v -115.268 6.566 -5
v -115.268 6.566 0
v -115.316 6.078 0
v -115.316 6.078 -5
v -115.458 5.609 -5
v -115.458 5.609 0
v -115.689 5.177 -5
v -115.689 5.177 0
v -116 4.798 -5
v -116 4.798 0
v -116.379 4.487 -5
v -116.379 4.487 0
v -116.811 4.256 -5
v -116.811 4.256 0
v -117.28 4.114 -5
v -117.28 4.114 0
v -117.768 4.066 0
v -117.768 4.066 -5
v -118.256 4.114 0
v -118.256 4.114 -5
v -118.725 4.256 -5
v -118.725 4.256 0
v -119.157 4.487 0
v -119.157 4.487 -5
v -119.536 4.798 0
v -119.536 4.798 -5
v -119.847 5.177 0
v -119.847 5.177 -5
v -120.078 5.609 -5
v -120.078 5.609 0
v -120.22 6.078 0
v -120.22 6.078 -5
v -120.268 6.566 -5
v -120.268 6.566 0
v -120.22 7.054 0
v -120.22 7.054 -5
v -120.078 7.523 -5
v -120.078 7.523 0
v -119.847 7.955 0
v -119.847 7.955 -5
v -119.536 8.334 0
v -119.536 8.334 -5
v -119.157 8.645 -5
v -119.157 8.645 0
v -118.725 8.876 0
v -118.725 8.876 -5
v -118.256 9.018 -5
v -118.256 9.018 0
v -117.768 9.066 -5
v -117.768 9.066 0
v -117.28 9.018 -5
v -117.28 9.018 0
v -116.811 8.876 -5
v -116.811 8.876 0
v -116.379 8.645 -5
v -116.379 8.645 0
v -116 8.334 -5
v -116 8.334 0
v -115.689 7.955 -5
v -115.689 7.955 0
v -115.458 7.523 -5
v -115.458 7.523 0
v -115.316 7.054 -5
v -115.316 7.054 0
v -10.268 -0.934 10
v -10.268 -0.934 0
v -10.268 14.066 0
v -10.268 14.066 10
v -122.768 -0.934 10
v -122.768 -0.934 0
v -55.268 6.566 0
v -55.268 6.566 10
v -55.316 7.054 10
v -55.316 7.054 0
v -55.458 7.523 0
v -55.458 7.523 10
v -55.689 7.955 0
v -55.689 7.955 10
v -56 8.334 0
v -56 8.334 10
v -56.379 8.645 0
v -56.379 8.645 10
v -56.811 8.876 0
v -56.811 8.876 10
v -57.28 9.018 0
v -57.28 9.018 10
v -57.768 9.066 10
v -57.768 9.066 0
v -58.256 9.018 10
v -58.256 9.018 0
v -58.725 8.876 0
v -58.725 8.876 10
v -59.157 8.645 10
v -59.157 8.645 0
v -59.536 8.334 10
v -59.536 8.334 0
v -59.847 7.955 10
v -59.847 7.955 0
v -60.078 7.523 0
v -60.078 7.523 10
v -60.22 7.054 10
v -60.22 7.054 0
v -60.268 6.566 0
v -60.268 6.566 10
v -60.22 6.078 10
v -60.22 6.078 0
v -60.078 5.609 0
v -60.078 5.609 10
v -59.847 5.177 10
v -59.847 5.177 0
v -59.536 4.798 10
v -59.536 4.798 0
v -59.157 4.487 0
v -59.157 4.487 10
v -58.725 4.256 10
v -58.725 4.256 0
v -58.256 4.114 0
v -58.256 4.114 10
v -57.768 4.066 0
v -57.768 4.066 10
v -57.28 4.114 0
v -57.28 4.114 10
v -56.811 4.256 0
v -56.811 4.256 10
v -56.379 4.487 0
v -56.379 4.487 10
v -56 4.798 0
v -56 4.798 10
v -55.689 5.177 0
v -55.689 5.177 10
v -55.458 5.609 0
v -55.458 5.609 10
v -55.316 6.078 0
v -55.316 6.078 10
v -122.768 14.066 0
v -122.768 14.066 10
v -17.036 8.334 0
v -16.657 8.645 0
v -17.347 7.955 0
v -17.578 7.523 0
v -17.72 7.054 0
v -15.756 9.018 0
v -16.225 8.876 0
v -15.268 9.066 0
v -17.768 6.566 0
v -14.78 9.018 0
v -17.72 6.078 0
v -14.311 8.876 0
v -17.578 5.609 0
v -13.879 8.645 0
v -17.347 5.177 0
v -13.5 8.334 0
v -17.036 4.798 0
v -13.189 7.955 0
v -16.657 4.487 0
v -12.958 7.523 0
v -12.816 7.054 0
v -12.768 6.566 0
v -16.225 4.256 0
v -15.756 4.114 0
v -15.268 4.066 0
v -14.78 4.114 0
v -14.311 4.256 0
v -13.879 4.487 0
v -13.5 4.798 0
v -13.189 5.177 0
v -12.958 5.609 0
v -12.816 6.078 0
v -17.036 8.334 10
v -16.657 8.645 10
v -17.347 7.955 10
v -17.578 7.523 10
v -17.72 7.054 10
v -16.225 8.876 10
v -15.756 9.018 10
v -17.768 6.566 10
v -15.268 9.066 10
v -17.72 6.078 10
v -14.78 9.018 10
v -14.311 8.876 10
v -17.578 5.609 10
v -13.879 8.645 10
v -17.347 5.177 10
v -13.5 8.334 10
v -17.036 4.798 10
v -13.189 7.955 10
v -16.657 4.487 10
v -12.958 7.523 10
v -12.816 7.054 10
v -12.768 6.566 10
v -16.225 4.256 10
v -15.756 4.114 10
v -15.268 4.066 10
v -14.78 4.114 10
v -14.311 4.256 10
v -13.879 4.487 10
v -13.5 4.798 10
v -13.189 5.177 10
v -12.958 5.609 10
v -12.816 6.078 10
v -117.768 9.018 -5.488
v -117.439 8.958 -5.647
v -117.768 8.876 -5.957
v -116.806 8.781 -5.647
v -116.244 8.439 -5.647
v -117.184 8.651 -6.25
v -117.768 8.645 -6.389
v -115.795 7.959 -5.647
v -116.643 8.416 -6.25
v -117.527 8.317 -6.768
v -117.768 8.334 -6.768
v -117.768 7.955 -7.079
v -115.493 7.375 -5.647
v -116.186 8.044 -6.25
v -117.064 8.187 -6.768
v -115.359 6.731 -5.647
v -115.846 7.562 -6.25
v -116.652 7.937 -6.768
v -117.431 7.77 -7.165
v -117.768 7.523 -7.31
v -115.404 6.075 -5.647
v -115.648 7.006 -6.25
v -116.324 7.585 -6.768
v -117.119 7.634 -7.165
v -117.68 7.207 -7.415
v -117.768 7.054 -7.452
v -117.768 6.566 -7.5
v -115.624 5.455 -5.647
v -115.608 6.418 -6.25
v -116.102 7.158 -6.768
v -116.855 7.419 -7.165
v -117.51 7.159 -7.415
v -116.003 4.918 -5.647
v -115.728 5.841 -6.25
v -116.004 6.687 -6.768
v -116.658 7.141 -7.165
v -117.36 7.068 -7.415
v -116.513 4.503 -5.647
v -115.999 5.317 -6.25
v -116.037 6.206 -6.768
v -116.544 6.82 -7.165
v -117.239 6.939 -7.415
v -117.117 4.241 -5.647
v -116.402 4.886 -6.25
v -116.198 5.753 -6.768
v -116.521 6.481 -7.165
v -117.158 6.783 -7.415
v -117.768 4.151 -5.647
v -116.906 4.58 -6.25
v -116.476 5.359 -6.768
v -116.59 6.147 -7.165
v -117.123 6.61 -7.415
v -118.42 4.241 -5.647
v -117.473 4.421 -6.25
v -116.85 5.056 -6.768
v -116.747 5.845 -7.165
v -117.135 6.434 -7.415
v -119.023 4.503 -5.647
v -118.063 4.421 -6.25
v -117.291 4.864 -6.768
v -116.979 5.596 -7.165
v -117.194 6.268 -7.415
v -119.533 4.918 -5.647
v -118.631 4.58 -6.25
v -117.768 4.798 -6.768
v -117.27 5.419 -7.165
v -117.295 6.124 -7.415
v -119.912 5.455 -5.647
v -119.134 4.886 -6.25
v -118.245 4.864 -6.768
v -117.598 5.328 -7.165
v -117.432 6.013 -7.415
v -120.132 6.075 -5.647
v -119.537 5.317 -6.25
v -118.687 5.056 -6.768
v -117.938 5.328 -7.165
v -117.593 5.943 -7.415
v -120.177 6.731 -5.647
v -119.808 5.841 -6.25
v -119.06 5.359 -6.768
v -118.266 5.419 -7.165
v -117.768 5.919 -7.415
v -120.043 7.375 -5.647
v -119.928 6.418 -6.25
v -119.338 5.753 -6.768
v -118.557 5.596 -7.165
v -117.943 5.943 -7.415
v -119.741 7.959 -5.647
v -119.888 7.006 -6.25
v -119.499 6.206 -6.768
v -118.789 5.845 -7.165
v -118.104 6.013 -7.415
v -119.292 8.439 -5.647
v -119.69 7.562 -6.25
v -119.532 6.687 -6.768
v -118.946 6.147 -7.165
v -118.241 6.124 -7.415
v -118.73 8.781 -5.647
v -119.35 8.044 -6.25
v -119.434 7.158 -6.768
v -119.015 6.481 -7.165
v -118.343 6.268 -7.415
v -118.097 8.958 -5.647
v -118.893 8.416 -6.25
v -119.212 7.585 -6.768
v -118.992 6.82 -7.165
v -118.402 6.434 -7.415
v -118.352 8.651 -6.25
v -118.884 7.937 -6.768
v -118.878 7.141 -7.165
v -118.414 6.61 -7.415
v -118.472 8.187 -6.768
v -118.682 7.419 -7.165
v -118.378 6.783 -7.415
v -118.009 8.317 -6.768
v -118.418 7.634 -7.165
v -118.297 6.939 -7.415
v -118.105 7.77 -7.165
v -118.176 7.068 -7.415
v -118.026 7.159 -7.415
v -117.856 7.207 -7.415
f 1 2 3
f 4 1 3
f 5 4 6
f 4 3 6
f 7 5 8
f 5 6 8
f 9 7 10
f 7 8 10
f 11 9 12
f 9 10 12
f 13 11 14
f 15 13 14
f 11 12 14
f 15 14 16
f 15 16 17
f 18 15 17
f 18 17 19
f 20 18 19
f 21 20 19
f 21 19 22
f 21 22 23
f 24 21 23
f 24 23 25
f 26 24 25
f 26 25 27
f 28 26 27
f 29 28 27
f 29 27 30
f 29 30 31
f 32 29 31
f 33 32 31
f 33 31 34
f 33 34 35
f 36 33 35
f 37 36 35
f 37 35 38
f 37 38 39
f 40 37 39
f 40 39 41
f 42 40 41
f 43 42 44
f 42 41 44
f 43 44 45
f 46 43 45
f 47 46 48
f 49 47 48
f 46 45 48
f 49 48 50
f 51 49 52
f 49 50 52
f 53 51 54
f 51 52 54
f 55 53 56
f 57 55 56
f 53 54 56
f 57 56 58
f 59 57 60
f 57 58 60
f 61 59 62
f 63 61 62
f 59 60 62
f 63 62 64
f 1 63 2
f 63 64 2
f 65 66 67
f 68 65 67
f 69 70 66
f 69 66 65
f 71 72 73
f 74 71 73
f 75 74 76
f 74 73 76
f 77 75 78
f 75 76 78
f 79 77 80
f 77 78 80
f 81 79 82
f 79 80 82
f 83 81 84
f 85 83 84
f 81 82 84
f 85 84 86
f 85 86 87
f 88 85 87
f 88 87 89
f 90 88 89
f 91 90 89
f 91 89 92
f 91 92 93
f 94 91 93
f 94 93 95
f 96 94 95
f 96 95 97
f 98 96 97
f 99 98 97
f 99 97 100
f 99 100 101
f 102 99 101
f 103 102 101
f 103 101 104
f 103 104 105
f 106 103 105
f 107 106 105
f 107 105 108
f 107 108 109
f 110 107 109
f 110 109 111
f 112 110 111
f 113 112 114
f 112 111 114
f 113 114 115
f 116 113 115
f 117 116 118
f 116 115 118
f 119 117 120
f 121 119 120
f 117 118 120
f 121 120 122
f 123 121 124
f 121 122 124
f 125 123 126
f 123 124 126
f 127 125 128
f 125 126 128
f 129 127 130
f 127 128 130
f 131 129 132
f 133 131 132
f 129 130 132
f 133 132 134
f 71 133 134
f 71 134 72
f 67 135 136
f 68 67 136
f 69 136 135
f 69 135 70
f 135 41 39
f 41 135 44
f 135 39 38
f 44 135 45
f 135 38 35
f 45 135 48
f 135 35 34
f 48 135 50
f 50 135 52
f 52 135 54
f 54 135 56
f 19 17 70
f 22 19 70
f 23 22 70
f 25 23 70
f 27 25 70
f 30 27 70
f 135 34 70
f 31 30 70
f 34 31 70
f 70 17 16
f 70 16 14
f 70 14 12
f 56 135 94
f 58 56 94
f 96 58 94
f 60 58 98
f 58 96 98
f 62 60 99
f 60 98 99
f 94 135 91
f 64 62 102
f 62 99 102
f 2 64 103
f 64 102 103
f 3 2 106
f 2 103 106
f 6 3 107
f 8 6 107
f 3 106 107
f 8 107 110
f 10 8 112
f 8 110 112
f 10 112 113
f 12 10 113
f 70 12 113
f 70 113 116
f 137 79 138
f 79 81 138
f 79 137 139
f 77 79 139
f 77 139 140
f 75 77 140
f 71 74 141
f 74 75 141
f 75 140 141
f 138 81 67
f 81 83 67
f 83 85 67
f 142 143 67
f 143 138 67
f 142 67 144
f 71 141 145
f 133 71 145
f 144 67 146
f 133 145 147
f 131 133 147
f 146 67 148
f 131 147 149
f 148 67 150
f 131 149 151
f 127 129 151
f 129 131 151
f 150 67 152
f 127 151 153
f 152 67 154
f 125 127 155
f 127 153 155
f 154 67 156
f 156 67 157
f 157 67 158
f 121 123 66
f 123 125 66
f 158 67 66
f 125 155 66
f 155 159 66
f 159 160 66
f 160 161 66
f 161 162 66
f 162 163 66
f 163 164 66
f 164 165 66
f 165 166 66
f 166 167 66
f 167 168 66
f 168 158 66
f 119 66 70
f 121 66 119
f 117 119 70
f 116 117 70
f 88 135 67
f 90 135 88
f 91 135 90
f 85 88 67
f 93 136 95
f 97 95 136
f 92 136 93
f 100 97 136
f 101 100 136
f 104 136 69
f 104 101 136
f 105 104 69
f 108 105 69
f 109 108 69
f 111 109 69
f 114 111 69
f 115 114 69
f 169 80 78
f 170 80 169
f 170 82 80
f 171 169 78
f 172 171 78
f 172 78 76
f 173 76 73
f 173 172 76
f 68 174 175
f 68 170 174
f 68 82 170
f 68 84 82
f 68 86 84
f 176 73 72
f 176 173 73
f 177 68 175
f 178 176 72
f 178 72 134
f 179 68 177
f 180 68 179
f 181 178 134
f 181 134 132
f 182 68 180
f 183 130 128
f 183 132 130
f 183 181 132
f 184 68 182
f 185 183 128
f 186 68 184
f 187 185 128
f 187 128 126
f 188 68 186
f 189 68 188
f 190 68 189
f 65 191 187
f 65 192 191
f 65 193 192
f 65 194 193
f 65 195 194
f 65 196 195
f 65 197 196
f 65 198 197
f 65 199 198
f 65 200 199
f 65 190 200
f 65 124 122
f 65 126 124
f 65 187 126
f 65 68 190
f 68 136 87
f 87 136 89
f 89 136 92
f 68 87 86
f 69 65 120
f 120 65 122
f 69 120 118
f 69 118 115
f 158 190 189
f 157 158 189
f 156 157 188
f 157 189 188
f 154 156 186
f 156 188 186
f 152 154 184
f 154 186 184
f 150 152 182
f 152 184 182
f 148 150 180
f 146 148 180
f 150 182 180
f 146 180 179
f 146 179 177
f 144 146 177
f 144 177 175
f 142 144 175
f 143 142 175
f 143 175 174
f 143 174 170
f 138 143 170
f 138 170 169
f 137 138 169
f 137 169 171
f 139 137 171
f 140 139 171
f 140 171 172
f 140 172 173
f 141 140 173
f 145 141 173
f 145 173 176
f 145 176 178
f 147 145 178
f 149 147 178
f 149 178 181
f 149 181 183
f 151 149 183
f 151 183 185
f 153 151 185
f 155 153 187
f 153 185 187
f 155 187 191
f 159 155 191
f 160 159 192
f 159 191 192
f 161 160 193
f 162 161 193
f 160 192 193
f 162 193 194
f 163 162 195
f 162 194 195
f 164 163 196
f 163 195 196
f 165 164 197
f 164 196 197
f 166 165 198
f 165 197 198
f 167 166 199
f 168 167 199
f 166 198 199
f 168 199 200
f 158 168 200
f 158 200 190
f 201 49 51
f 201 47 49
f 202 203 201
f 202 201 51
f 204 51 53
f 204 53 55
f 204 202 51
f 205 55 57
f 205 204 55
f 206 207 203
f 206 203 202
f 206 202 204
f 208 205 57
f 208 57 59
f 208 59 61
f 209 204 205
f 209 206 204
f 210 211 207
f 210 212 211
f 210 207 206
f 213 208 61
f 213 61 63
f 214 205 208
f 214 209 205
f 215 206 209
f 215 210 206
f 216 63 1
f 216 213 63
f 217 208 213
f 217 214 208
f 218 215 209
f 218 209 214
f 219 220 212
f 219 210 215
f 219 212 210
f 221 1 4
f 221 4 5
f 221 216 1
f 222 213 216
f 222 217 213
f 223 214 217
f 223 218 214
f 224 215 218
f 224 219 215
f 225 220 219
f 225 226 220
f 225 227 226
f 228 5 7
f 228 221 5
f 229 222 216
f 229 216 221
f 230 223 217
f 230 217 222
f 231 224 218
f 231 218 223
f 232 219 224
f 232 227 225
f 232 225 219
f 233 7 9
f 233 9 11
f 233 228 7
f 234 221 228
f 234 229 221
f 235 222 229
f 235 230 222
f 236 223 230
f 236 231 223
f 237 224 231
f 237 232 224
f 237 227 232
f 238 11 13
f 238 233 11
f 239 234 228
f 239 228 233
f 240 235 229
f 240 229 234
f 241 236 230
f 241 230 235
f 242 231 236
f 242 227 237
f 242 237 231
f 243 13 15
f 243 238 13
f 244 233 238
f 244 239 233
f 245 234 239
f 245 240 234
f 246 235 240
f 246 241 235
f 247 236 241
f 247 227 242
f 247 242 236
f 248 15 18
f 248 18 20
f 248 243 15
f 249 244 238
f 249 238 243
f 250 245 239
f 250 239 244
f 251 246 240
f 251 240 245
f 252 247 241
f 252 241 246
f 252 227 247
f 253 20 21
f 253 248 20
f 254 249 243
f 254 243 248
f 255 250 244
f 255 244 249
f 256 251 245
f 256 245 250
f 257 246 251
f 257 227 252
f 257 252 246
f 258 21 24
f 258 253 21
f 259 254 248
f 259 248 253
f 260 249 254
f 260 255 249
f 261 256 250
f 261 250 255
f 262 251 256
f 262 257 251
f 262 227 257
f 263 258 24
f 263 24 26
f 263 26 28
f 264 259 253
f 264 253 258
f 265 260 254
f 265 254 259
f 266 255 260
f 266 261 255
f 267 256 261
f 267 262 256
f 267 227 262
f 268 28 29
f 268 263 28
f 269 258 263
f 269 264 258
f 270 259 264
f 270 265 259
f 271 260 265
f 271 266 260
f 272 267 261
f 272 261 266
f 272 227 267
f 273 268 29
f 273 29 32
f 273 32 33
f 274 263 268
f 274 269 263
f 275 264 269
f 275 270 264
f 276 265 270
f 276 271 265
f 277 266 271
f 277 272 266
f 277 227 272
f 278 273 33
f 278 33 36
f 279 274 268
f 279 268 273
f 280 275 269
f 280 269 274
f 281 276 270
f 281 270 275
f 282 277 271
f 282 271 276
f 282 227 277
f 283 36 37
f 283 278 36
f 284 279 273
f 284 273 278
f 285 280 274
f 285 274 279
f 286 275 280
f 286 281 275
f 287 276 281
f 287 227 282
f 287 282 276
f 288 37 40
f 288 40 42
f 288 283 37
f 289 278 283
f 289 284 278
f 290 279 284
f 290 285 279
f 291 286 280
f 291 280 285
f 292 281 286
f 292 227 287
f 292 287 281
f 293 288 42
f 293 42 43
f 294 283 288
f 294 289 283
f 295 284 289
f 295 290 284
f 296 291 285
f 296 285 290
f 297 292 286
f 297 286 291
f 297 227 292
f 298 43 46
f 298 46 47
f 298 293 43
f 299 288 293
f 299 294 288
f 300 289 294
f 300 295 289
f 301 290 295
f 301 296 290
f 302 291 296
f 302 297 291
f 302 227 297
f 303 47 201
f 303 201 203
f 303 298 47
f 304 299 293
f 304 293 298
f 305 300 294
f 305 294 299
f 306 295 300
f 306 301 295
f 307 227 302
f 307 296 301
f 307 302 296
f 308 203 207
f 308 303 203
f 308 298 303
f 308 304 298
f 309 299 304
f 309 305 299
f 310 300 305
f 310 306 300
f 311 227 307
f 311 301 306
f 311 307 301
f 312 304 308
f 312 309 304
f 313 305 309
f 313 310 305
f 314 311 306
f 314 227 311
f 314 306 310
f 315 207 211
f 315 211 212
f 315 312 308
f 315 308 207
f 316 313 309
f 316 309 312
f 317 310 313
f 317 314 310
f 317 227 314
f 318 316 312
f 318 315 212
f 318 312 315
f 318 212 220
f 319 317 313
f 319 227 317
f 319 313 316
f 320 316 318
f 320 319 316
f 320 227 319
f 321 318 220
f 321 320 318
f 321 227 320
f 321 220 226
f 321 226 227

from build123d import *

# Parameters (mm, degrees)
F0_W     = 52.5
F0_H     = 15
F1_DEPTH = 10
F2_R     = 2.5
F3_DEPTH = 25
F4_W     = 15
F4_H     = 10
F5_DEPTH = 60
F6_R     = 2.5
F7_DEPTH = 5


with BuildPart() as f1:
    # F0 (on Top) → F1 (new body)
    with BuildSketch(Plane.XY):
        with Locations((-36.5180644393, 6.5659499308)):
            Rectangle(F0_W, F0_H)
    extrude(amount=F1_DEPTH)

    # F2 (on face) → F3 (cut)
    with BuildSketch(Plane.XY.offset(10)):
        with Locations((-15.2680644393, 6.5659499308)):
            Circle(F2_R)
        with Locations((-57.7680644393, 6.5659499308)):
            Circle(F2_R)
    extrude(amount=-F3_DEPTH, mode=Mode.SUBTRACT)

    # F4 (on face) → F5 (join)
    with BuildSketch(Plane(origin=(-62.7680644393, 0, 0), x_dir=(0, -1, 0), z_dir=(-1, 0, 0))):
        with Locations((-6.5659499308, 5)):
            Rectangle(F4_W, F4_H)
    extrude(amount=F5_DEPTH)

    # F6 (on face) → F7 (join)
    with BuildSketch(Plane(origin=(0, 0, 0), x_dir=(1, 0, 0), z_dir=(0, 0, -1))):
        with Locations((-117.7680644393, -6.5659499308)):
            Circle(F6_R)
    extrude(amount=F7_DEPTH)

    # F10 (on offset) → F11 (revolve)
    with BuildSketch(Plane(origin=(-117.7680644393, 0, 0), x_dir=(0, -1, 0), z_dir=(-1, 0, 0))):
        with BuildLine():
            Line((-6.5659499308, -5), (-9.0659499308, -5))
            ThreePointArc((-9.0659499308, -5), (-8.3337168838, -6.767766953), (-6.5659499308, -7.5))
            Line((-6.5659499308, -7.5), (-6.5659499308, -5))
        make_face()
    revolve(axis=Axis((-117.7680644393, 6.5659499308, -6.25), (0, 0, -1)))


solid = f1.part
